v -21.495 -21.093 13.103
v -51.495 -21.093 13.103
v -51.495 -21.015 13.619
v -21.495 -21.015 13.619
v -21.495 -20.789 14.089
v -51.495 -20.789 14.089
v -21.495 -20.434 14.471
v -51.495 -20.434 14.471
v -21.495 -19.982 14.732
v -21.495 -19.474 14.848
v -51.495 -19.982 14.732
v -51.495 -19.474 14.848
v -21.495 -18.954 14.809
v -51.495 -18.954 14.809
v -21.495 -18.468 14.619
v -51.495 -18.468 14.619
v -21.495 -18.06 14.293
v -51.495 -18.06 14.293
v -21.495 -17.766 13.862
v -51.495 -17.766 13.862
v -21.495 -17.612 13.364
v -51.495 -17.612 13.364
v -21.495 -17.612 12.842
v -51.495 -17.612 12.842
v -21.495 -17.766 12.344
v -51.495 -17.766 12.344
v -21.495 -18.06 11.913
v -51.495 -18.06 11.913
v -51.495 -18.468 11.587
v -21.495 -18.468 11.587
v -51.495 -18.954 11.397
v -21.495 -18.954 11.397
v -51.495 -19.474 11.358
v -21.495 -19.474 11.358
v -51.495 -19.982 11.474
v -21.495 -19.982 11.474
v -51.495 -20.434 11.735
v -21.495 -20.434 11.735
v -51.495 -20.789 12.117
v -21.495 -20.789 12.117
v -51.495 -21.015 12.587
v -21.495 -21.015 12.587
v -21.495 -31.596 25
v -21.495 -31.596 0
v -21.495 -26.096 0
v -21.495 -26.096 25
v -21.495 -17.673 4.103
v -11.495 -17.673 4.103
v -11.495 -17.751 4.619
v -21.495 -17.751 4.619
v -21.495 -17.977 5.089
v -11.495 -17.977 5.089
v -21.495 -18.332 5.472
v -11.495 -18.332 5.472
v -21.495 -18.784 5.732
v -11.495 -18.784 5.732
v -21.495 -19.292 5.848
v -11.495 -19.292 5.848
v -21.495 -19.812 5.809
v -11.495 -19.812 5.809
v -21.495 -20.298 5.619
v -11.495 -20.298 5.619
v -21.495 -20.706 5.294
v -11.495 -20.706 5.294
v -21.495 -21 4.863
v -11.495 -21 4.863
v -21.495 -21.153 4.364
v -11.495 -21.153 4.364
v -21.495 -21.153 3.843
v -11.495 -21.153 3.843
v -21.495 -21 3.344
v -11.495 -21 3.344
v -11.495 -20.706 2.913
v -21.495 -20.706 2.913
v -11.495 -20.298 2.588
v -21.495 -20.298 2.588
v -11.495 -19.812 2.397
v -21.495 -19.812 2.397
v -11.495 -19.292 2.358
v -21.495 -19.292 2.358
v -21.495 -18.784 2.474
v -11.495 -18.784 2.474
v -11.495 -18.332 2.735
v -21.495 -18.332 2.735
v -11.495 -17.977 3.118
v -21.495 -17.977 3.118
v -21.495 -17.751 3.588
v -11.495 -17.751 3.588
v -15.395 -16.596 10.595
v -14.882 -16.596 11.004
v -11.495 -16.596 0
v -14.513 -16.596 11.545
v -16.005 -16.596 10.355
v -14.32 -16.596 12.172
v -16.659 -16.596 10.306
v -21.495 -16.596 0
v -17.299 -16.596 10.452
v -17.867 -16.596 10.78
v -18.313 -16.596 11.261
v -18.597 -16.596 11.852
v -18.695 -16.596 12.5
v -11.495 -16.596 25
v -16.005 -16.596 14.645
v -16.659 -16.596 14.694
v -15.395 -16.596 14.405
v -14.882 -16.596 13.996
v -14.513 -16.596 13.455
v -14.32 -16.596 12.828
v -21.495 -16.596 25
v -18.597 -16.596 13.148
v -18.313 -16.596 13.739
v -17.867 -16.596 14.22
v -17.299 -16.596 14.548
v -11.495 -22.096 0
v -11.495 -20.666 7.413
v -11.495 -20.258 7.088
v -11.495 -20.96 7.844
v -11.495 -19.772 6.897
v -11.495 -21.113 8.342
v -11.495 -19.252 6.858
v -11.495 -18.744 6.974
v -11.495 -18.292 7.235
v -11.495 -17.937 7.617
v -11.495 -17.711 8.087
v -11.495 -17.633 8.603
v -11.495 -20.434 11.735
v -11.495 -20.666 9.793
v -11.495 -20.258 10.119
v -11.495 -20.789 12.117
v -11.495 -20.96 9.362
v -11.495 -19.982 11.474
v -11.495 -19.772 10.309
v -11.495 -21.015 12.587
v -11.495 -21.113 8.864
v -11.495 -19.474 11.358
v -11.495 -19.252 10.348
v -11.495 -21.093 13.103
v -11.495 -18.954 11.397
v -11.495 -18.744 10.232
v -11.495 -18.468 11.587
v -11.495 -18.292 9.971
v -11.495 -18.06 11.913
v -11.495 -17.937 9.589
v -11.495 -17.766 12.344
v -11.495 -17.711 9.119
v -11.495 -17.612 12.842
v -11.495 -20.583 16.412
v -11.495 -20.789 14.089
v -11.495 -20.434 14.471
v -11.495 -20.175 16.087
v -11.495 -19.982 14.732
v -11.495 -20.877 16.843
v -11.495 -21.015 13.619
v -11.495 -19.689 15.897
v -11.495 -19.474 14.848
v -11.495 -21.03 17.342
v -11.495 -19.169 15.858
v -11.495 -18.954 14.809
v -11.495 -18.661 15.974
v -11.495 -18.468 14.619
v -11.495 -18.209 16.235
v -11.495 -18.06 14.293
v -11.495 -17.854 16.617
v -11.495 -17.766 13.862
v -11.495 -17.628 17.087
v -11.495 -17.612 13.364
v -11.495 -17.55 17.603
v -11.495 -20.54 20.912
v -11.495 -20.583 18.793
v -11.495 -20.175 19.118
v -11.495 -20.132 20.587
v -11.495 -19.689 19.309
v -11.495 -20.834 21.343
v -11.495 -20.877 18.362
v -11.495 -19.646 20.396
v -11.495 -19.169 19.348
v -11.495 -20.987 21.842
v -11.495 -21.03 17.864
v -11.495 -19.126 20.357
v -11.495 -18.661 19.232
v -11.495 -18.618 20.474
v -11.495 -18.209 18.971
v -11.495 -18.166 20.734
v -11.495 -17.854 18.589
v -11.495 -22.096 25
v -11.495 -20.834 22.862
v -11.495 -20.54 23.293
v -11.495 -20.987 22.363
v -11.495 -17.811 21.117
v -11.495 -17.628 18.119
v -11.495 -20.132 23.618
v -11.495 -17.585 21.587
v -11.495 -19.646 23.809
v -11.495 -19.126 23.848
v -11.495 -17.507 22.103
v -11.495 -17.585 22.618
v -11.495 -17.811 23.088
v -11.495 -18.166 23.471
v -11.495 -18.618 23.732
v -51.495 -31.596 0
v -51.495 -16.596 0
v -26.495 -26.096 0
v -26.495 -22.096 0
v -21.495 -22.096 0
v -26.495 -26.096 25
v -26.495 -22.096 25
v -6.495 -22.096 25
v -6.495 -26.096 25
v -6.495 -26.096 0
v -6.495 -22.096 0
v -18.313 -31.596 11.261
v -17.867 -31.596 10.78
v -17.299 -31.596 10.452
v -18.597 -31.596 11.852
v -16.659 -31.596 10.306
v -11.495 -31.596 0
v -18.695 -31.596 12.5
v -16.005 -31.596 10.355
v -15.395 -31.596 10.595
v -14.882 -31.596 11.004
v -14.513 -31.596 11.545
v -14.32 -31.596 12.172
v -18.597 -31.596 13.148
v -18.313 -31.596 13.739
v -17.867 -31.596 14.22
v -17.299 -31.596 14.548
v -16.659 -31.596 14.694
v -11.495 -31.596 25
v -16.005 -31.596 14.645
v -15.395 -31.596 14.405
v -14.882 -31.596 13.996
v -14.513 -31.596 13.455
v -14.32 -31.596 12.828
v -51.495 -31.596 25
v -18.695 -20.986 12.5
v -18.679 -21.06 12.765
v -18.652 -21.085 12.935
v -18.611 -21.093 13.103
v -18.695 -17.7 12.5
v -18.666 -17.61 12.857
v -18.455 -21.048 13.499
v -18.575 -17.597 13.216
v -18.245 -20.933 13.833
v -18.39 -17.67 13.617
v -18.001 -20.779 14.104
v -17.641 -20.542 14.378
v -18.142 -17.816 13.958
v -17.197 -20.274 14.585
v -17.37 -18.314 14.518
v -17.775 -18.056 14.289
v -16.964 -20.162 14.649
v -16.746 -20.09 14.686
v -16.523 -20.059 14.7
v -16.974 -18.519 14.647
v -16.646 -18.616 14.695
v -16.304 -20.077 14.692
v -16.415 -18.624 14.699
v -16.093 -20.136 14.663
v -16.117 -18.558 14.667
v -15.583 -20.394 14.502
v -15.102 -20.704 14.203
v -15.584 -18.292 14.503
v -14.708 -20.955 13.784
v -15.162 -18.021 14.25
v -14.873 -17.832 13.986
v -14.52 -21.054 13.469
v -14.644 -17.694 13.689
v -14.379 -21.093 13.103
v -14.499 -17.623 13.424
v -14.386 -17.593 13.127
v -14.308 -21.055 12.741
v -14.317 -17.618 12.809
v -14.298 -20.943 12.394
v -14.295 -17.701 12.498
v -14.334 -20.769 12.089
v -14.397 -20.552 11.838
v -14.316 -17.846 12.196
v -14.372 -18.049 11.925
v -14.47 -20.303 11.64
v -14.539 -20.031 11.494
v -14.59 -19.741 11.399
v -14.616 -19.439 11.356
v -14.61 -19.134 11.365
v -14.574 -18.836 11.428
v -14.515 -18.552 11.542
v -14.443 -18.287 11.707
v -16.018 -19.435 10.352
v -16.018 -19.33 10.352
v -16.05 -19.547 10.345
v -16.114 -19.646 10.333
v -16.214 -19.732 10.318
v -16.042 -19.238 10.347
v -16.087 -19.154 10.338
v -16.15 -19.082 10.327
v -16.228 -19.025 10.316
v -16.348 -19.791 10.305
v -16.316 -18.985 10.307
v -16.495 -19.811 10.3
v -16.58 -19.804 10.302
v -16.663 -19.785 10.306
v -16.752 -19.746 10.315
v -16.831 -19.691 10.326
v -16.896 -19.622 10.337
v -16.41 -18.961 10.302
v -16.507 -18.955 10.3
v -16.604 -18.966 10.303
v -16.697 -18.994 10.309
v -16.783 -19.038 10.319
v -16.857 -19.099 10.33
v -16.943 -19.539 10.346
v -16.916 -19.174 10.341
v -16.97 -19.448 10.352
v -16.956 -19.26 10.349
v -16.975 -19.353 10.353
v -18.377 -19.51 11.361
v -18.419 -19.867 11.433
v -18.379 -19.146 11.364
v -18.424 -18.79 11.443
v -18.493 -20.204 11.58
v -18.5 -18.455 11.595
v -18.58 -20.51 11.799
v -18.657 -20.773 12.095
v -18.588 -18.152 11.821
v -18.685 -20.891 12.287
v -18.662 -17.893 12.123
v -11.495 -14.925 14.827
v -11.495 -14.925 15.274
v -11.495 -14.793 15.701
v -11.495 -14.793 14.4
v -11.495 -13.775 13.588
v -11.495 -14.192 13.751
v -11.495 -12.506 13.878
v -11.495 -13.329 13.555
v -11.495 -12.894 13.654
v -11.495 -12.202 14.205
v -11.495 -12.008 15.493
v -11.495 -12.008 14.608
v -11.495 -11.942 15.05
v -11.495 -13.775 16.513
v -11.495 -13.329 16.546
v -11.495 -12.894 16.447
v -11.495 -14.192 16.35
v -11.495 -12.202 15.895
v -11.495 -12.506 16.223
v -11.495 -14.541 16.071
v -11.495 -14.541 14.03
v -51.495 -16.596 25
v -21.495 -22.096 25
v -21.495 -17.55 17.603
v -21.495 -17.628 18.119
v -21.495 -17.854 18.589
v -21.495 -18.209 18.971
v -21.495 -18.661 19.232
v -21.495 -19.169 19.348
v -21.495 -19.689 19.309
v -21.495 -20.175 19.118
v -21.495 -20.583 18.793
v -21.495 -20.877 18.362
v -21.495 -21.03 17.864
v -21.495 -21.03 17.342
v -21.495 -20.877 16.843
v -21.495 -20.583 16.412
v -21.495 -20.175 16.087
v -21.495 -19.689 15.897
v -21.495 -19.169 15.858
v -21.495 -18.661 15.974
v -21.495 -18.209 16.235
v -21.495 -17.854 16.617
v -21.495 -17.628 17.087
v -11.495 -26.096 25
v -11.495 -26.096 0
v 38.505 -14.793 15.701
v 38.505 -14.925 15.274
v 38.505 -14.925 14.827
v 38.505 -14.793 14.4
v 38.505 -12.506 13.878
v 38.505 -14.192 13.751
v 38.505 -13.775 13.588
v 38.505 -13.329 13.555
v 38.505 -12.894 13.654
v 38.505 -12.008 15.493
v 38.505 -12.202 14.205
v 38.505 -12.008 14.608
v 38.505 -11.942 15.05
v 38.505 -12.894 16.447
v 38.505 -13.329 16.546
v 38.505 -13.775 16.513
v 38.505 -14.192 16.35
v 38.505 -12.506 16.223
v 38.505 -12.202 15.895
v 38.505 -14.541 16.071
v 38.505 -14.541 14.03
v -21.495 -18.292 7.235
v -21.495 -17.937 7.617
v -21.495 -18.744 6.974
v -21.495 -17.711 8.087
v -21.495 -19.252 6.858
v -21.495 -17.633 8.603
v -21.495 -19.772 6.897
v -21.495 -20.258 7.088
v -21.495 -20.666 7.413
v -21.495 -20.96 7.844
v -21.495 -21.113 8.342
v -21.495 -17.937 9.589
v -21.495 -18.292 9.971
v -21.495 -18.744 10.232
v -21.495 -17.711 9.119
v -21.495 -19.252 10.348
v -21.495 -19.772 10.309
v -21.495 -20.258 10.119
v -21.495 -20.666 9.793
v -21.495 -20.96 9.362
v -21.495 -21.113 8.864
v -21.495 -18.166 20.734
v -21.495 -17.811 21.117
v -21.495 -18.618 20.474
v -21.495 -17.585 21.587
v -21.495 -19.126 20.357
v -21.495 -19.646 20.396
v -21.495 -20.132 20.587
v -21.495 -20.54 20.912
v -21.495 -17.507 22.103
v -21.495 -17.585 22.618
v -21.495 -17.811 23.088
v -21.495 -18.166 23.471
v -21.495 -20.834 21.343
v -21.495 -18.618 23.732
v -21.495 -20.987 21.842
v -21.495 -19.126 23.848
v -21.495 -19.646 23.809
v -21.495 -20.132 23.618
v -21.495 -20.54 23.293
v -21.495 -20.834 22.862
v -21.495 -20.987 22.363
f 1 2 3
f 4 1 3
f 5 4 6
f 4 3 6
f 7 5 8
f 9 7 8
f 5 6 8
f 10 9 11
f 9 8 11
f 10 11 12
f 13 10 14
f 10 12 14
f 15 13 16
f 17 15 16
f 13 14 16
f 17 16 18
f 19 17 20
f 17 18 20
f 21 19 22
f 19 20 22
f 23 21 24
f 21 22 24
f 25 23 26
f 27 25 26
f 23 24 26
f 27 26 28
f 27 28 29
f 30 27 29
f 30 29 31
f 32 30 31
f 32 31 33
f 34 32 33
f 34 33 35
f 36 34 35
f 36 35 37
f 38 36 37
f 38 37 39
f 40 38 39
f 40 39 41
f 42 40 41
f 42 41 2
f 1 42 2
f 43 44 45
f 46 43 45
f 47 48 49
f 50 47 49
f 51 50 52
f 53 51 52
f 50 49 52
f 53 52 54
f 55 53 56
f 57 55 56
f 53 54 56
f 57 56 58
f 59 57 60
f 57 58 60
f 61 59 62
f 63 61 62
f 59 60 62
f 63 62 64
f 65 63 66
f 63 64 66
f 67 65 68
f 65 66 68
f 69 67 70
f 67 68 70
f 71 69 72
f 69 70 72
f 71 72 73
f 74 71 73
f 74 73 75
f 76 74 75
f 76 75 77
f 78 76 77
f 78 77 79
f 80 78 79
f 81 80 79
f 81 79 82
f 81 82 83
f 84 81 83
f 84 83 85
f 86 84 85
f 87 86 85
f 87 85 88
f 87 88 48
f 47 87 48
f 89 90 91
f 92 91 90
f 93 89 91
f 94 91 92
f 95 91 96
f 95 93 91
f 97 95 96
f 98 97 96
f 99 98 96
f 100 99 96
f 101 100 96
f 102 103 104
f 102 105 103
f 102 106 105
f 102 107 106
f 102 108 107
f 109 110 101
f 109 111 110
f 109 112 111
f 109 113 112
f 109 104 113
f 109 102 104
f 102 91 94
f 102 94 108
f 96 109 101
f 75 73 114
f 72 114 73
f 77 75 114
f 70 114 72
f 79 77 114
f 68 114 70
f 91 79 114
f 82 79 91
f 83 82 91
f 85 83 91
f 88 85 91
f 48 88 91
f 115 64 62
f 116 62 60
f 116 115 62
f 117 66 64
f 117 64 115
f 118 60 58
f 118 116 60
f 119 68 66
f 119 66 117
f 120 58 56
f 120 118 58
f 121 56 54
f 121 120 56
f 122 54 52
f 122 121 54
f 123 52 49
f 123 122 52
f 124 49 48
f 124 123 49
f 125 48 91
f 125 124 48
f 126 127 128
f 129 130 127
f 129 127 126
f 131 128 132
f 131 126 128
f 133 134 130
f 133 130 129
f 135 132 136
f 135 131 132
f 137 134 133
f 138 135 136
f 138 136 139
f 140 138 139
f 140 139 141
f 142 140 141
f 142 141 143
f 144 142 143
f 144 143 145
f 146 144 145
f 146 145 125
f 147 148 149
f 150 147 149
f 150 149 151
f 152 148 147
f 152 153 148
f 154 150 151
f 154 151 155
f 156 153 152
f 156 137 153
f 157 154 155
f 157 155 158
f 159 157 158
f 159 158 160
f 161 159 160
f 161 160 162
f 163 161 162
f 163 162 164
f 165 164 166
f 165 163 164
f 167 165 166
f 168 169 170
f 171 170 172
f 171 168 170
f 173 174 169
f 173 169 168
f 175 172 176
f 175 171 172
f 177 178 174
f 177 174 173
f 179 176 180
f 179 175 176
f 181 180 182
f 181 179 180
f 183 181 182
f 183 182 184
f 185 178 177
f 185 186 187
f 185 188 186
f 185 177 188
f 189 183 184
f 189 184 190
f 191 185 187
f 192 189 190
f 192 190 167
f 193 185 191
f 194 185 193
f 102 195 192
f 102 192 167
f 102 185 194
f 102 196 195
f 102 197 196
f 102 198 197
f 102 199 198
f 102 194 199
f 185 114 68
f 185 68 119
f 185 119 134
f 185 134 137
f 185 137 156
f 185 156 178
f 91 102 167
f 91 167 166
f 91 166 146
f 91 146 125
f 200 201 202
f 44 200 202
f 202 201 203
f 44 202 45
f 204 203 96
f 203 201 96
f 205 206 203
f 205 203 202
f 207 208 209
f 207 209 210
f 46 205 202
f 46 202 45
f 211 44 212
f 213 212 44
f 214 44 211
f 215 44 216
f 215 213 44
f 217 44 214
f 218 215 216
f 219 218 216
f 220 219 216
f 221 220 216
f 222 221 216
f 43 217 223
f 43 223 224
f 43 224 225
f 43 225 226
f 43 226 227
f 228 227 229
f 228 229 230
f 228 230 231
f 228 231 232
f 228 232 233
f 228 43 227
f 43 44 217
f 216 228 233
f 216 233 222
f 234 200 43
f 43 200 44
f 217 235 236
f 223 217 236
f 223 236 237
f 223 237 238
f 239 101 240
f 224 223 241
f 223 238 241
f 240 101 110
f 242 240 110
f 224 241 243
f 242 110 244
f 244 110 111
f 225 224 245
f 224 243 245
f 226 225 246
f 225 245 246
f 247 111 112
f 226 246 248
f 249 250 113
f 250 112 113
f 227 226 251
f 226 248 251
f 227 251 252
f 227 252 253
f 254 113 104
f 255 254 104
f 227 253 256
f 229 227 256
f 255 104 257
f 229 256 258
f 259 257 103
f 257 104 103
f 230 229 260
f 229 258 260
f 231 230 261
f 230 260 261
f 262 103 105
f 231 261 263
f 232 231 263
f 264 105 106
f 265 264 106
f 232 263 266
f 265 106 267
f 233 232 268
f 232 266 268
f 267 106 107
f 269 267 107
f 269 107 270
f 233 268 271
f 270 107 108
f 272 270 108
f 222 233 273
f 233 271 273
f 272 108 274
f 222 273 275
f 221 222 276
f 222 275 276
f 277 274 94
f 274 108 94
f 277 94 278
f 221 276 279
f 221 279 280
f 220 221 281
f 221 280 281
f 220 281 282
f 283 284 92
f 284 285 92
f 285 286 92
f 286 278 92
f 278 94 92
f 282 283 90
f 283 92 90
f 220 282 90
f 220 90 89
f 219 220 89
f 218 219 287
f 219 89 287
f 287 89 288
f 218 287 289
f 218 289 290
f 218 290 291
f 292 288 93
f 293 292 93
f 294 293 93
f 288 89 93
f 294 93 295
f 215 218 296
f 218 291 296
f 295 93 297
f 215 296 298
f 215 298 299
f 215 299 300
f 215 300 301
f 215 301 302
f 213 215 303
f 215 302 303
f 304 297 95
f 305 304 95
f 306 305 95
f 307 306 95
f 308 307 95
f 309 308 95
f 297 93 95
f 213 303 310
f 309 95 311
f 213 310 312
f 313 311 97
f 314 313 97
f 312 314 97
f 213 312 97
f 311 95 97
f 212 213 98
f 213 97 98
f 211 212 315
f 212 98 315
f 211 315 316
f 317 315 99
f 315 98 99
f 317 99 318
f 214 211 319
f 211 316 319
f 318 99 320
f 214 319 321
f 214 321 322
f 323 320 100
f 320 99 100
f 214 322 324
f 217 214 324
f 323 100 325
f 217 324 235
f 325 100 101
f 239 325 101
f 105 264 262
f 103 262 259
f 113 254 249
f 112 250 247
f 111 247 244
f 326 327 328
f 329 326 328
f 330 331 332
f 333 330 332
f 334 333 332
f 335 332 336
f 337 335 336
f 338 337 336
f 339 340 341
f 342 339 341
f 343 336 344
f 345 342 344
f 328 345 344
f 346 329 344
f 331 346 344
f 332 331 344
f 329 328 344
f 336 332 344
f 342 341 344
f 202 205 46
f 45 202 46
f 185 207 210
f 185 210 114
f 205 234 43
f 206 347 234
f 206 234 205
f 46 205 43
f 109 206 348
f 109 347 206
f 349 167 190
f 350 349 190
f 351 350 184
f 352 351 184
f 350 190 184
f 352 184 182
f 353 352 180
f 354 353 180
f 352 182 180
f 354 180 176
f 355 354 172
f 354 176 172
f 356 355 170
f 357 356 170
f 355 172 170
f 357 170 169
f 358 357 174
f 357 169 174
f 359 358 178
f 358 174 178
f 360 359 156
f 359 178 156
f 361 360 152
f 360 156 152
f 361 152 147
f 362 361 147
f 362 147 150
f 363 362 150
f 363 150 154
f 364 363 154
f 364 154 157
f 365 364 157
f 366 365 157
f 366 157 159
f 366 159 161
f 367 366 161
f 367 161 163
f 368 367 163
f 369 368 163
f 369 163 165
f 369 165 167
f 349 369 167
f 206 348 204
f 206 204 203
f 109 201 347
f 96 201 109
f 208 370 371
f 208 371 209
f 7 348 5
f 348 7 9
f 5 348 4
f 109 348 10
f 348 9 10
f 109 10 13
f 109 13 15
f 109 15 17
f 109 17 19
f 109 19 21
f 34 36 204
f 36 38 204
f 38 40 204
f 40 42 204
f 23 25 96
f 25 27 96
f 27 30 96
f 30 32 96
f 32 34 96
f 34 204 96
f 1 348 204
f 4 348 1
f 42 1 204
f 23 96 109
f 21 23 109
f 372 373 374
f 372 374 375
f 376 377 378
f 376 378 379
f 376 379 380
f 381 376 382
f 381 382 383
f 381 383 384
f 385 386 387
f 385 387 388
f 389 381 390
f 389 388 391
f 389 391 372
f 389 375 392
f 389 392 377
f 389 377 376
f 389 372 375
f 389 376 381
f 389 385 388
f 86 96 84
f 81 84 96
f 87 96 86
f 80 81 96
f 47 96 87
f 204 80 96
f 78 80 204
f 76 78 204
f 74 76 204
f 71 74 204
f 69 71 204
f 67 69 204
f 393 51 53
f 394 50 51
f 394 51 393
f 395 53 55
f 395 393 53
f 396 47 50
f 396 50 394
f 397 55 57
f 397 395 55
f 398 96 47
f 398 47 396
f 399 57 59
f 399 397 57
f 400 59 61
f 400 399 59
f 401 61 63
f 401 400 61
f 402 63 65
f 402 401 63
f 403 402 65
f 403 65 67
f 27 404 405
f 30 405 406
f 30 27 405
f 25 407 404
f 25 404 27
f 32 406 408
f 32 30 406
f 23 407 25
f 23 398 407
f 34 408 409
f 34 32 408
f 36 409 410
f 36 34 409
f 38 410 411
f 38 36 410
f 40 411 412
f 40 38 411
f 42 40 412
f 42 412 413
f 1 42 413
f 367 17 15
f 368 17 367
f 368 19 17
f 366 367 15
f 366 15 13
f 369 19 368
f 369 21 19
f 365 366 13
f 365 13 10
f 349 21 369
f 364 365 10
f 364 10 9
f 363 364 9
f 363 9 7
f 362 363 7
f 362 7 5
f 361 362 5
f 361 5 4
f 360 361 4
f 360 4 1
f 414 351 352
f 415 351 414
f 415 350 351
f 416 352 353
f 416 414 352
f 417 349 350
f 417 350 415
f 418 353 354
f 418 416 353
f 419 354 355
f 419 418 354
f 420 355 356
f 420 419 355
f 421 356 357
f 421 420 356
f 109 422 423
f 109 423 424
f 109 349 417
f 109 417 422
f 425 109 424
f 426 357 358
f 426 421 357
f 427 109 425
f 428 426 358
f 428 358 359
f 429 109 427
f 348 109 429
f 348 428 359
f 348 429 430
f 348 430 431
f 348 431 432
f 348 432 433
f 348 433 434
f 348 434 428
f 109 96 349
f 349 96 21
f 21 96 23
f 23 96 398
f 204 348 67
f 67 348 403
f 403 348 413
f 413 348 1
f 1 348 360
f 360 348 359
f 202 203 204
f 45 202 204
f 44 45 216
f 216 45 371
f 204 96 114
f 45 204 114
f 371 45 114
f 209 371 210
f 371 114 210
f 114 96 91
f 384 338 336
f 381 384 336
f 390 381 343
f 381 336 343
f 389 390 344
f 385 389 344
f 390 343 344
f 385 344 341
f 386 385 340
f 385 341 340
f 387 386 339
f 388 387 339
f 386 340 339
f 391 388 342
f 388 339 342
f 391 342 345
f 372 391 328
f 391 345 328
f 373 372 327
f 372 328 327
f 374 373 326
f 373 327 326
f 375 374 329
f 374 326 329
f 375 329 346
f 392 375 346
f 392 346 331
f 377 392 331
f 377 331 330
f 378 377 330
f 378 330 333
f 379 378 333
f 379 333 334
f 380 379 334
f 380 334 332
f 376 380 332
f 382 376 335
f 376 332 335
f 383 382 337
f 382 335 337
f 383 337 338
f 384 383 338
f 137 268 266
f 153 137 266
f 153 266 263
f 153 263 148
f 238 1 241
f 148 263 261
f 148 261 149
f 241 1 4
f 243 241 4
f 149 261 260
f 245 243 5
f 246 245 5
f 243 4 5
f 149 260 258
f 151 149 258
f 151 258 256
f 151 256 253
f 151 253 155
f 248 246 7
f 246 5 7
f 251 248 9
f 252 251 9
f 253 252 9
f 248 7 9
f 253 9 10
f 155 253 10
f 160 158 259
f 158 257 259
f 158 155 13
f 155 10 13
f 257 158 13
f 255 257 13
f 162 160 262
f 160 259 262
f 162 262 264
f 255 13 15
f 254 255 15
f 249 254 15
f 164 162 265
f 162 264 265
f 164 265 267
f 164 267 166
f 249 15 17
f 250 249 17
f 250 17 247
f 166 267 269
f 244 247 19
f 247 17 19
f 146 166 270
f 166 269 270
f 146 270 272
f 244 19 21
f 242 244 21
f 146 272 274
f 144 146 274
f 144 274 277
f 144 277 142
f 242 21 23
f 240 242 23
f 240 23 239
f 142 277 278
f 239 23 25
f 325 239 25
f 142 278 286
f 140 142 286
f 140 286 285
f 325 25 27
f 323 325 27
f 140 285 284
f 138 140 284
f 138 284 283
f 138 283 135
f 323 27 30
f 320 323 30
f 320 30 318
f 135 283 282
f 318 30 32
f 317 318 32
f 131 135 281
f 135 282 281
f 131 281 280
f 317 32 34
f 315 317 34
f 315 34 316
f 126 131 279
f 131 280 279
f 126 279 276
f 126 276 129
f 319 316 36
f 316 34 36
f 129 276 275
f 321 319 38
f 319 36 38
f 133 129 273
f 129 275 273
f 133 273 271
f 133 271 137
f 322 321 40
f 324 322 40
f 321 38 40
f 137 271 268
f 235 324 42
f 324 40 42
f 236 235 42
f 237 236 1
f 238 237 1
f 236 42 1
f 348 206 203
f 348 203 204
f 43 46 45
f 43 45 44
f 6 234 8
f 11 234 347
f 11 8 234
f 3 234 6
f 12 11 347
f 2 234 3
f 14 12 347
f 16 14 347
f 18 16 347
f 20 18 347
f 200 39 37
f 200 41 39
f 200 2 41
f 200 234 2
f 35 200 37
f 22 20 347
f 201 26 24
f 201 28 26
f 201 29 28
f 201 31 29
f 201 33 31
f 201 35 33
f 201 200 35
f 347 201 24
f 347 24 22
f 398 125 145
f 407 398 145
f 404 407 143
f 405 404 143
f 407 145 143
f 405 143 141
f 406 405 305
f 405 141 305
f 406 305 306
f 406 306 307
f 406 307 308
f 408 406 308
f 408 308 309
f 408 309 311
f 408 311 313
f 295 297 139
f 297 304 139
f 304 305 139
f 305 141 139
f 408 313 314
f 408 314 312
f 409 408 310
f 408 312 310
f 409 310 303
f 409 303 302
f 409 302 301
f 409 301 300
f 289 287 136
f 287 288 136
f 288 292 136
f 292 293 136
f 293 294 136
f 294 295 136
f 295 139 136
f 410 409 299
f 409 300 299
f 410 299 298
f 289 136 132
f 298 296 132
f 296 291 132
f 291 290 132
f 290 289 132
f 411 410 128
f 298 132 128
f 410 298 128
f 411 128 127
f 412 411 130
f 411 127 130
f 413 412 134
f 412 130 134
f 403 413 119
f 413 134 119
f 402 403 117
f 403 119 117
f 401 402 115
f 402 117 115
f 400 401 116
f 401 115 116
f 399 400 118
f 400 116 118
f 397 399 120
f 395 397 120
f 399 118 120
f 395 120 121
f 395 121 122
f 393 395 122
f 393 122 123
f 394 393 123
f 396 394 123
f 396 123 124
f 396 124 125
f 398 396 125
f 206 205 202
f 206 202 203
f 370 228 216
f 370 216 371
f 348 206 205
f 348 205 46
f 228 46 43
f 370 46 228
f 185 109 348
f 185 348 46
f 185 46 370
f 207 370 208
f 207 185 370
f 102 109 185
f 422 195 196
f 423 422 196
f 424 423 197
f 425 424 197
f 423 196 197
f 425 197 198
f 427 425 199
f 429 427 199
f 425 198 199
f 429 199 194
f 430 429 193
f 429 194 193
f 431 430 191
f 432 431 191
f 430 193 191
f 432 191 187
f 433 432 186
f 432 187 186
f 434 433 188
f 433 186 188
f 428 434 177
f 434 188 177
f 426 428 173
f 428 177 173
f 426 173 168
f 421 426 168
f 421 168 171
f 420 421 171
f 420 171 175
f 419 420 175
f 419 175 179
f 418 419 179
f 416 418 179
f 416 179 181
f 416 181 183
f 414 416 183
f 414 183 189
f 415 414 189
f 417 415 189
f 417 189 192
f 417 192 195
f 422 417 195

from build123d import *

# Parameters (mm, degrees)
F0_W      = 30
F0_H      = 15
F1_DEPTH  = 25
F2_W      = 5
F2_H      = 4
F3_DEPTH  = 25.001
F5_DEPTH  = 25
F6_R      = 1.75
F7_DEPTH  = 45.001
F8_R      = 1.75
F9_DEPTH  = 40.001
F10_R     = 1.5
F11_DEPTH = 50
F13_D     = 4.4


# Not quite as in the source:
# - a feature names something its author has since deleted; it is built from what else it names


with BuildPart() as f1:
    # F0 (on Top) → F1 (new body)
    with BuildSketch(Plane.XY):
        with Locations((-36.4950267971, -24.0964780748)):
            Rectangle(F0_W, F0_H)
    extrude(amount=F1_DEPTH)

    # F2 (on face) → F3 (cut, through all)
    with BuildSketch(Plane.XY.offset(25)):
        with Locations((-23.9950267971, -24.0964780748)):
            Rectangle(F2_W, F2_H)
    extrude(amount=-F3_DEPTH, mode=Mode.SUBTRACT)


with BuildPart() as f5:
    # F4 (on face) → F5 (new body)
    with BuildSketch(Plane.XY.offset(25)):
        Polygon((-11.4950267971, -16.5964780748), (-21.4950267971, -16.5964780748), (-21.4950267971, -22.0964780748), (-26.4950267971, -22.0964780748), (-26.4950267971, -26.0964780748), (-21.4950267971, -26.0964780748), (-21.4950267971, -31.5964780748), (-11.4950267971, -31.5964780748), (-11.4950267971, -26.0964780748), (-6.4950267971, -26.0964780748), (-6.4950267971, -22.0964780748), (-11.4950267971, -22.0964780748), align=None)
    extrude(amount=-F5_DEPTH)


with BuildPart() as f7_tool:
    # F6 (on face) → F7 (new body, through all)
    with BuildSketch(Plane(origin=(-51.4950267971, 0, 0), x_dir=(0, -1, 0), z_dir=(-1, 0, 0))):
        with Locations((19.3429368734, 13.1029868498)):
            Circle(F6_R)
    extrude(amount=-F7_DEPTH)


with BuildPart() as f1_1:
    add(f1.part)

    # F7: cut by f7_tool
    add(f7_tool.part, mode=Mode.SUBTRACT)


with BuildPart() as f5_1:
    add(f5.part)

    # F7: cut by f7_tool
    add(f7_tool.part, mode=Mode.SUBTRACT)

    # F8 (on face) → F9 (cut, through all)
    with BuildSketch(Plane.YZ.offset(-11.4950267971)):
        with Locations((-19.257010007, 22.1025766501)):
            Circle(F8_R)
        with Locations((-19.2999734402, 17.60278175)):
            Circle(F8_R)
        with Locations((-19.3829028493, 8.6031643288)):
            Circle(F8_R)
        with Locations((-19.4228688251, 4.1033418078)):
            Circle(F8_R)
    extrude(amount=-F9_DEPTH, mode=Mode.SUBTRACT)

    # F13 (through all)
    with Locations(Plane.XZ.offset(31.5964780748)):
        with Locations((-16.4950267971, 12.5)):
            Hole(F13_D / 2)


with BuildPart() as f11:
    # F10 (on face) → F11 (new body)
    with BuildSketch(Plane.YZ.offset(-11.4950267971)):
        with Locations((-13.4415747598, 15.0504745543)):
            Circle(F10_R)
    extrude(amount=F11_DEPTH)


solid = Compound([f1_1.part, f5_1.part, f11.part])
